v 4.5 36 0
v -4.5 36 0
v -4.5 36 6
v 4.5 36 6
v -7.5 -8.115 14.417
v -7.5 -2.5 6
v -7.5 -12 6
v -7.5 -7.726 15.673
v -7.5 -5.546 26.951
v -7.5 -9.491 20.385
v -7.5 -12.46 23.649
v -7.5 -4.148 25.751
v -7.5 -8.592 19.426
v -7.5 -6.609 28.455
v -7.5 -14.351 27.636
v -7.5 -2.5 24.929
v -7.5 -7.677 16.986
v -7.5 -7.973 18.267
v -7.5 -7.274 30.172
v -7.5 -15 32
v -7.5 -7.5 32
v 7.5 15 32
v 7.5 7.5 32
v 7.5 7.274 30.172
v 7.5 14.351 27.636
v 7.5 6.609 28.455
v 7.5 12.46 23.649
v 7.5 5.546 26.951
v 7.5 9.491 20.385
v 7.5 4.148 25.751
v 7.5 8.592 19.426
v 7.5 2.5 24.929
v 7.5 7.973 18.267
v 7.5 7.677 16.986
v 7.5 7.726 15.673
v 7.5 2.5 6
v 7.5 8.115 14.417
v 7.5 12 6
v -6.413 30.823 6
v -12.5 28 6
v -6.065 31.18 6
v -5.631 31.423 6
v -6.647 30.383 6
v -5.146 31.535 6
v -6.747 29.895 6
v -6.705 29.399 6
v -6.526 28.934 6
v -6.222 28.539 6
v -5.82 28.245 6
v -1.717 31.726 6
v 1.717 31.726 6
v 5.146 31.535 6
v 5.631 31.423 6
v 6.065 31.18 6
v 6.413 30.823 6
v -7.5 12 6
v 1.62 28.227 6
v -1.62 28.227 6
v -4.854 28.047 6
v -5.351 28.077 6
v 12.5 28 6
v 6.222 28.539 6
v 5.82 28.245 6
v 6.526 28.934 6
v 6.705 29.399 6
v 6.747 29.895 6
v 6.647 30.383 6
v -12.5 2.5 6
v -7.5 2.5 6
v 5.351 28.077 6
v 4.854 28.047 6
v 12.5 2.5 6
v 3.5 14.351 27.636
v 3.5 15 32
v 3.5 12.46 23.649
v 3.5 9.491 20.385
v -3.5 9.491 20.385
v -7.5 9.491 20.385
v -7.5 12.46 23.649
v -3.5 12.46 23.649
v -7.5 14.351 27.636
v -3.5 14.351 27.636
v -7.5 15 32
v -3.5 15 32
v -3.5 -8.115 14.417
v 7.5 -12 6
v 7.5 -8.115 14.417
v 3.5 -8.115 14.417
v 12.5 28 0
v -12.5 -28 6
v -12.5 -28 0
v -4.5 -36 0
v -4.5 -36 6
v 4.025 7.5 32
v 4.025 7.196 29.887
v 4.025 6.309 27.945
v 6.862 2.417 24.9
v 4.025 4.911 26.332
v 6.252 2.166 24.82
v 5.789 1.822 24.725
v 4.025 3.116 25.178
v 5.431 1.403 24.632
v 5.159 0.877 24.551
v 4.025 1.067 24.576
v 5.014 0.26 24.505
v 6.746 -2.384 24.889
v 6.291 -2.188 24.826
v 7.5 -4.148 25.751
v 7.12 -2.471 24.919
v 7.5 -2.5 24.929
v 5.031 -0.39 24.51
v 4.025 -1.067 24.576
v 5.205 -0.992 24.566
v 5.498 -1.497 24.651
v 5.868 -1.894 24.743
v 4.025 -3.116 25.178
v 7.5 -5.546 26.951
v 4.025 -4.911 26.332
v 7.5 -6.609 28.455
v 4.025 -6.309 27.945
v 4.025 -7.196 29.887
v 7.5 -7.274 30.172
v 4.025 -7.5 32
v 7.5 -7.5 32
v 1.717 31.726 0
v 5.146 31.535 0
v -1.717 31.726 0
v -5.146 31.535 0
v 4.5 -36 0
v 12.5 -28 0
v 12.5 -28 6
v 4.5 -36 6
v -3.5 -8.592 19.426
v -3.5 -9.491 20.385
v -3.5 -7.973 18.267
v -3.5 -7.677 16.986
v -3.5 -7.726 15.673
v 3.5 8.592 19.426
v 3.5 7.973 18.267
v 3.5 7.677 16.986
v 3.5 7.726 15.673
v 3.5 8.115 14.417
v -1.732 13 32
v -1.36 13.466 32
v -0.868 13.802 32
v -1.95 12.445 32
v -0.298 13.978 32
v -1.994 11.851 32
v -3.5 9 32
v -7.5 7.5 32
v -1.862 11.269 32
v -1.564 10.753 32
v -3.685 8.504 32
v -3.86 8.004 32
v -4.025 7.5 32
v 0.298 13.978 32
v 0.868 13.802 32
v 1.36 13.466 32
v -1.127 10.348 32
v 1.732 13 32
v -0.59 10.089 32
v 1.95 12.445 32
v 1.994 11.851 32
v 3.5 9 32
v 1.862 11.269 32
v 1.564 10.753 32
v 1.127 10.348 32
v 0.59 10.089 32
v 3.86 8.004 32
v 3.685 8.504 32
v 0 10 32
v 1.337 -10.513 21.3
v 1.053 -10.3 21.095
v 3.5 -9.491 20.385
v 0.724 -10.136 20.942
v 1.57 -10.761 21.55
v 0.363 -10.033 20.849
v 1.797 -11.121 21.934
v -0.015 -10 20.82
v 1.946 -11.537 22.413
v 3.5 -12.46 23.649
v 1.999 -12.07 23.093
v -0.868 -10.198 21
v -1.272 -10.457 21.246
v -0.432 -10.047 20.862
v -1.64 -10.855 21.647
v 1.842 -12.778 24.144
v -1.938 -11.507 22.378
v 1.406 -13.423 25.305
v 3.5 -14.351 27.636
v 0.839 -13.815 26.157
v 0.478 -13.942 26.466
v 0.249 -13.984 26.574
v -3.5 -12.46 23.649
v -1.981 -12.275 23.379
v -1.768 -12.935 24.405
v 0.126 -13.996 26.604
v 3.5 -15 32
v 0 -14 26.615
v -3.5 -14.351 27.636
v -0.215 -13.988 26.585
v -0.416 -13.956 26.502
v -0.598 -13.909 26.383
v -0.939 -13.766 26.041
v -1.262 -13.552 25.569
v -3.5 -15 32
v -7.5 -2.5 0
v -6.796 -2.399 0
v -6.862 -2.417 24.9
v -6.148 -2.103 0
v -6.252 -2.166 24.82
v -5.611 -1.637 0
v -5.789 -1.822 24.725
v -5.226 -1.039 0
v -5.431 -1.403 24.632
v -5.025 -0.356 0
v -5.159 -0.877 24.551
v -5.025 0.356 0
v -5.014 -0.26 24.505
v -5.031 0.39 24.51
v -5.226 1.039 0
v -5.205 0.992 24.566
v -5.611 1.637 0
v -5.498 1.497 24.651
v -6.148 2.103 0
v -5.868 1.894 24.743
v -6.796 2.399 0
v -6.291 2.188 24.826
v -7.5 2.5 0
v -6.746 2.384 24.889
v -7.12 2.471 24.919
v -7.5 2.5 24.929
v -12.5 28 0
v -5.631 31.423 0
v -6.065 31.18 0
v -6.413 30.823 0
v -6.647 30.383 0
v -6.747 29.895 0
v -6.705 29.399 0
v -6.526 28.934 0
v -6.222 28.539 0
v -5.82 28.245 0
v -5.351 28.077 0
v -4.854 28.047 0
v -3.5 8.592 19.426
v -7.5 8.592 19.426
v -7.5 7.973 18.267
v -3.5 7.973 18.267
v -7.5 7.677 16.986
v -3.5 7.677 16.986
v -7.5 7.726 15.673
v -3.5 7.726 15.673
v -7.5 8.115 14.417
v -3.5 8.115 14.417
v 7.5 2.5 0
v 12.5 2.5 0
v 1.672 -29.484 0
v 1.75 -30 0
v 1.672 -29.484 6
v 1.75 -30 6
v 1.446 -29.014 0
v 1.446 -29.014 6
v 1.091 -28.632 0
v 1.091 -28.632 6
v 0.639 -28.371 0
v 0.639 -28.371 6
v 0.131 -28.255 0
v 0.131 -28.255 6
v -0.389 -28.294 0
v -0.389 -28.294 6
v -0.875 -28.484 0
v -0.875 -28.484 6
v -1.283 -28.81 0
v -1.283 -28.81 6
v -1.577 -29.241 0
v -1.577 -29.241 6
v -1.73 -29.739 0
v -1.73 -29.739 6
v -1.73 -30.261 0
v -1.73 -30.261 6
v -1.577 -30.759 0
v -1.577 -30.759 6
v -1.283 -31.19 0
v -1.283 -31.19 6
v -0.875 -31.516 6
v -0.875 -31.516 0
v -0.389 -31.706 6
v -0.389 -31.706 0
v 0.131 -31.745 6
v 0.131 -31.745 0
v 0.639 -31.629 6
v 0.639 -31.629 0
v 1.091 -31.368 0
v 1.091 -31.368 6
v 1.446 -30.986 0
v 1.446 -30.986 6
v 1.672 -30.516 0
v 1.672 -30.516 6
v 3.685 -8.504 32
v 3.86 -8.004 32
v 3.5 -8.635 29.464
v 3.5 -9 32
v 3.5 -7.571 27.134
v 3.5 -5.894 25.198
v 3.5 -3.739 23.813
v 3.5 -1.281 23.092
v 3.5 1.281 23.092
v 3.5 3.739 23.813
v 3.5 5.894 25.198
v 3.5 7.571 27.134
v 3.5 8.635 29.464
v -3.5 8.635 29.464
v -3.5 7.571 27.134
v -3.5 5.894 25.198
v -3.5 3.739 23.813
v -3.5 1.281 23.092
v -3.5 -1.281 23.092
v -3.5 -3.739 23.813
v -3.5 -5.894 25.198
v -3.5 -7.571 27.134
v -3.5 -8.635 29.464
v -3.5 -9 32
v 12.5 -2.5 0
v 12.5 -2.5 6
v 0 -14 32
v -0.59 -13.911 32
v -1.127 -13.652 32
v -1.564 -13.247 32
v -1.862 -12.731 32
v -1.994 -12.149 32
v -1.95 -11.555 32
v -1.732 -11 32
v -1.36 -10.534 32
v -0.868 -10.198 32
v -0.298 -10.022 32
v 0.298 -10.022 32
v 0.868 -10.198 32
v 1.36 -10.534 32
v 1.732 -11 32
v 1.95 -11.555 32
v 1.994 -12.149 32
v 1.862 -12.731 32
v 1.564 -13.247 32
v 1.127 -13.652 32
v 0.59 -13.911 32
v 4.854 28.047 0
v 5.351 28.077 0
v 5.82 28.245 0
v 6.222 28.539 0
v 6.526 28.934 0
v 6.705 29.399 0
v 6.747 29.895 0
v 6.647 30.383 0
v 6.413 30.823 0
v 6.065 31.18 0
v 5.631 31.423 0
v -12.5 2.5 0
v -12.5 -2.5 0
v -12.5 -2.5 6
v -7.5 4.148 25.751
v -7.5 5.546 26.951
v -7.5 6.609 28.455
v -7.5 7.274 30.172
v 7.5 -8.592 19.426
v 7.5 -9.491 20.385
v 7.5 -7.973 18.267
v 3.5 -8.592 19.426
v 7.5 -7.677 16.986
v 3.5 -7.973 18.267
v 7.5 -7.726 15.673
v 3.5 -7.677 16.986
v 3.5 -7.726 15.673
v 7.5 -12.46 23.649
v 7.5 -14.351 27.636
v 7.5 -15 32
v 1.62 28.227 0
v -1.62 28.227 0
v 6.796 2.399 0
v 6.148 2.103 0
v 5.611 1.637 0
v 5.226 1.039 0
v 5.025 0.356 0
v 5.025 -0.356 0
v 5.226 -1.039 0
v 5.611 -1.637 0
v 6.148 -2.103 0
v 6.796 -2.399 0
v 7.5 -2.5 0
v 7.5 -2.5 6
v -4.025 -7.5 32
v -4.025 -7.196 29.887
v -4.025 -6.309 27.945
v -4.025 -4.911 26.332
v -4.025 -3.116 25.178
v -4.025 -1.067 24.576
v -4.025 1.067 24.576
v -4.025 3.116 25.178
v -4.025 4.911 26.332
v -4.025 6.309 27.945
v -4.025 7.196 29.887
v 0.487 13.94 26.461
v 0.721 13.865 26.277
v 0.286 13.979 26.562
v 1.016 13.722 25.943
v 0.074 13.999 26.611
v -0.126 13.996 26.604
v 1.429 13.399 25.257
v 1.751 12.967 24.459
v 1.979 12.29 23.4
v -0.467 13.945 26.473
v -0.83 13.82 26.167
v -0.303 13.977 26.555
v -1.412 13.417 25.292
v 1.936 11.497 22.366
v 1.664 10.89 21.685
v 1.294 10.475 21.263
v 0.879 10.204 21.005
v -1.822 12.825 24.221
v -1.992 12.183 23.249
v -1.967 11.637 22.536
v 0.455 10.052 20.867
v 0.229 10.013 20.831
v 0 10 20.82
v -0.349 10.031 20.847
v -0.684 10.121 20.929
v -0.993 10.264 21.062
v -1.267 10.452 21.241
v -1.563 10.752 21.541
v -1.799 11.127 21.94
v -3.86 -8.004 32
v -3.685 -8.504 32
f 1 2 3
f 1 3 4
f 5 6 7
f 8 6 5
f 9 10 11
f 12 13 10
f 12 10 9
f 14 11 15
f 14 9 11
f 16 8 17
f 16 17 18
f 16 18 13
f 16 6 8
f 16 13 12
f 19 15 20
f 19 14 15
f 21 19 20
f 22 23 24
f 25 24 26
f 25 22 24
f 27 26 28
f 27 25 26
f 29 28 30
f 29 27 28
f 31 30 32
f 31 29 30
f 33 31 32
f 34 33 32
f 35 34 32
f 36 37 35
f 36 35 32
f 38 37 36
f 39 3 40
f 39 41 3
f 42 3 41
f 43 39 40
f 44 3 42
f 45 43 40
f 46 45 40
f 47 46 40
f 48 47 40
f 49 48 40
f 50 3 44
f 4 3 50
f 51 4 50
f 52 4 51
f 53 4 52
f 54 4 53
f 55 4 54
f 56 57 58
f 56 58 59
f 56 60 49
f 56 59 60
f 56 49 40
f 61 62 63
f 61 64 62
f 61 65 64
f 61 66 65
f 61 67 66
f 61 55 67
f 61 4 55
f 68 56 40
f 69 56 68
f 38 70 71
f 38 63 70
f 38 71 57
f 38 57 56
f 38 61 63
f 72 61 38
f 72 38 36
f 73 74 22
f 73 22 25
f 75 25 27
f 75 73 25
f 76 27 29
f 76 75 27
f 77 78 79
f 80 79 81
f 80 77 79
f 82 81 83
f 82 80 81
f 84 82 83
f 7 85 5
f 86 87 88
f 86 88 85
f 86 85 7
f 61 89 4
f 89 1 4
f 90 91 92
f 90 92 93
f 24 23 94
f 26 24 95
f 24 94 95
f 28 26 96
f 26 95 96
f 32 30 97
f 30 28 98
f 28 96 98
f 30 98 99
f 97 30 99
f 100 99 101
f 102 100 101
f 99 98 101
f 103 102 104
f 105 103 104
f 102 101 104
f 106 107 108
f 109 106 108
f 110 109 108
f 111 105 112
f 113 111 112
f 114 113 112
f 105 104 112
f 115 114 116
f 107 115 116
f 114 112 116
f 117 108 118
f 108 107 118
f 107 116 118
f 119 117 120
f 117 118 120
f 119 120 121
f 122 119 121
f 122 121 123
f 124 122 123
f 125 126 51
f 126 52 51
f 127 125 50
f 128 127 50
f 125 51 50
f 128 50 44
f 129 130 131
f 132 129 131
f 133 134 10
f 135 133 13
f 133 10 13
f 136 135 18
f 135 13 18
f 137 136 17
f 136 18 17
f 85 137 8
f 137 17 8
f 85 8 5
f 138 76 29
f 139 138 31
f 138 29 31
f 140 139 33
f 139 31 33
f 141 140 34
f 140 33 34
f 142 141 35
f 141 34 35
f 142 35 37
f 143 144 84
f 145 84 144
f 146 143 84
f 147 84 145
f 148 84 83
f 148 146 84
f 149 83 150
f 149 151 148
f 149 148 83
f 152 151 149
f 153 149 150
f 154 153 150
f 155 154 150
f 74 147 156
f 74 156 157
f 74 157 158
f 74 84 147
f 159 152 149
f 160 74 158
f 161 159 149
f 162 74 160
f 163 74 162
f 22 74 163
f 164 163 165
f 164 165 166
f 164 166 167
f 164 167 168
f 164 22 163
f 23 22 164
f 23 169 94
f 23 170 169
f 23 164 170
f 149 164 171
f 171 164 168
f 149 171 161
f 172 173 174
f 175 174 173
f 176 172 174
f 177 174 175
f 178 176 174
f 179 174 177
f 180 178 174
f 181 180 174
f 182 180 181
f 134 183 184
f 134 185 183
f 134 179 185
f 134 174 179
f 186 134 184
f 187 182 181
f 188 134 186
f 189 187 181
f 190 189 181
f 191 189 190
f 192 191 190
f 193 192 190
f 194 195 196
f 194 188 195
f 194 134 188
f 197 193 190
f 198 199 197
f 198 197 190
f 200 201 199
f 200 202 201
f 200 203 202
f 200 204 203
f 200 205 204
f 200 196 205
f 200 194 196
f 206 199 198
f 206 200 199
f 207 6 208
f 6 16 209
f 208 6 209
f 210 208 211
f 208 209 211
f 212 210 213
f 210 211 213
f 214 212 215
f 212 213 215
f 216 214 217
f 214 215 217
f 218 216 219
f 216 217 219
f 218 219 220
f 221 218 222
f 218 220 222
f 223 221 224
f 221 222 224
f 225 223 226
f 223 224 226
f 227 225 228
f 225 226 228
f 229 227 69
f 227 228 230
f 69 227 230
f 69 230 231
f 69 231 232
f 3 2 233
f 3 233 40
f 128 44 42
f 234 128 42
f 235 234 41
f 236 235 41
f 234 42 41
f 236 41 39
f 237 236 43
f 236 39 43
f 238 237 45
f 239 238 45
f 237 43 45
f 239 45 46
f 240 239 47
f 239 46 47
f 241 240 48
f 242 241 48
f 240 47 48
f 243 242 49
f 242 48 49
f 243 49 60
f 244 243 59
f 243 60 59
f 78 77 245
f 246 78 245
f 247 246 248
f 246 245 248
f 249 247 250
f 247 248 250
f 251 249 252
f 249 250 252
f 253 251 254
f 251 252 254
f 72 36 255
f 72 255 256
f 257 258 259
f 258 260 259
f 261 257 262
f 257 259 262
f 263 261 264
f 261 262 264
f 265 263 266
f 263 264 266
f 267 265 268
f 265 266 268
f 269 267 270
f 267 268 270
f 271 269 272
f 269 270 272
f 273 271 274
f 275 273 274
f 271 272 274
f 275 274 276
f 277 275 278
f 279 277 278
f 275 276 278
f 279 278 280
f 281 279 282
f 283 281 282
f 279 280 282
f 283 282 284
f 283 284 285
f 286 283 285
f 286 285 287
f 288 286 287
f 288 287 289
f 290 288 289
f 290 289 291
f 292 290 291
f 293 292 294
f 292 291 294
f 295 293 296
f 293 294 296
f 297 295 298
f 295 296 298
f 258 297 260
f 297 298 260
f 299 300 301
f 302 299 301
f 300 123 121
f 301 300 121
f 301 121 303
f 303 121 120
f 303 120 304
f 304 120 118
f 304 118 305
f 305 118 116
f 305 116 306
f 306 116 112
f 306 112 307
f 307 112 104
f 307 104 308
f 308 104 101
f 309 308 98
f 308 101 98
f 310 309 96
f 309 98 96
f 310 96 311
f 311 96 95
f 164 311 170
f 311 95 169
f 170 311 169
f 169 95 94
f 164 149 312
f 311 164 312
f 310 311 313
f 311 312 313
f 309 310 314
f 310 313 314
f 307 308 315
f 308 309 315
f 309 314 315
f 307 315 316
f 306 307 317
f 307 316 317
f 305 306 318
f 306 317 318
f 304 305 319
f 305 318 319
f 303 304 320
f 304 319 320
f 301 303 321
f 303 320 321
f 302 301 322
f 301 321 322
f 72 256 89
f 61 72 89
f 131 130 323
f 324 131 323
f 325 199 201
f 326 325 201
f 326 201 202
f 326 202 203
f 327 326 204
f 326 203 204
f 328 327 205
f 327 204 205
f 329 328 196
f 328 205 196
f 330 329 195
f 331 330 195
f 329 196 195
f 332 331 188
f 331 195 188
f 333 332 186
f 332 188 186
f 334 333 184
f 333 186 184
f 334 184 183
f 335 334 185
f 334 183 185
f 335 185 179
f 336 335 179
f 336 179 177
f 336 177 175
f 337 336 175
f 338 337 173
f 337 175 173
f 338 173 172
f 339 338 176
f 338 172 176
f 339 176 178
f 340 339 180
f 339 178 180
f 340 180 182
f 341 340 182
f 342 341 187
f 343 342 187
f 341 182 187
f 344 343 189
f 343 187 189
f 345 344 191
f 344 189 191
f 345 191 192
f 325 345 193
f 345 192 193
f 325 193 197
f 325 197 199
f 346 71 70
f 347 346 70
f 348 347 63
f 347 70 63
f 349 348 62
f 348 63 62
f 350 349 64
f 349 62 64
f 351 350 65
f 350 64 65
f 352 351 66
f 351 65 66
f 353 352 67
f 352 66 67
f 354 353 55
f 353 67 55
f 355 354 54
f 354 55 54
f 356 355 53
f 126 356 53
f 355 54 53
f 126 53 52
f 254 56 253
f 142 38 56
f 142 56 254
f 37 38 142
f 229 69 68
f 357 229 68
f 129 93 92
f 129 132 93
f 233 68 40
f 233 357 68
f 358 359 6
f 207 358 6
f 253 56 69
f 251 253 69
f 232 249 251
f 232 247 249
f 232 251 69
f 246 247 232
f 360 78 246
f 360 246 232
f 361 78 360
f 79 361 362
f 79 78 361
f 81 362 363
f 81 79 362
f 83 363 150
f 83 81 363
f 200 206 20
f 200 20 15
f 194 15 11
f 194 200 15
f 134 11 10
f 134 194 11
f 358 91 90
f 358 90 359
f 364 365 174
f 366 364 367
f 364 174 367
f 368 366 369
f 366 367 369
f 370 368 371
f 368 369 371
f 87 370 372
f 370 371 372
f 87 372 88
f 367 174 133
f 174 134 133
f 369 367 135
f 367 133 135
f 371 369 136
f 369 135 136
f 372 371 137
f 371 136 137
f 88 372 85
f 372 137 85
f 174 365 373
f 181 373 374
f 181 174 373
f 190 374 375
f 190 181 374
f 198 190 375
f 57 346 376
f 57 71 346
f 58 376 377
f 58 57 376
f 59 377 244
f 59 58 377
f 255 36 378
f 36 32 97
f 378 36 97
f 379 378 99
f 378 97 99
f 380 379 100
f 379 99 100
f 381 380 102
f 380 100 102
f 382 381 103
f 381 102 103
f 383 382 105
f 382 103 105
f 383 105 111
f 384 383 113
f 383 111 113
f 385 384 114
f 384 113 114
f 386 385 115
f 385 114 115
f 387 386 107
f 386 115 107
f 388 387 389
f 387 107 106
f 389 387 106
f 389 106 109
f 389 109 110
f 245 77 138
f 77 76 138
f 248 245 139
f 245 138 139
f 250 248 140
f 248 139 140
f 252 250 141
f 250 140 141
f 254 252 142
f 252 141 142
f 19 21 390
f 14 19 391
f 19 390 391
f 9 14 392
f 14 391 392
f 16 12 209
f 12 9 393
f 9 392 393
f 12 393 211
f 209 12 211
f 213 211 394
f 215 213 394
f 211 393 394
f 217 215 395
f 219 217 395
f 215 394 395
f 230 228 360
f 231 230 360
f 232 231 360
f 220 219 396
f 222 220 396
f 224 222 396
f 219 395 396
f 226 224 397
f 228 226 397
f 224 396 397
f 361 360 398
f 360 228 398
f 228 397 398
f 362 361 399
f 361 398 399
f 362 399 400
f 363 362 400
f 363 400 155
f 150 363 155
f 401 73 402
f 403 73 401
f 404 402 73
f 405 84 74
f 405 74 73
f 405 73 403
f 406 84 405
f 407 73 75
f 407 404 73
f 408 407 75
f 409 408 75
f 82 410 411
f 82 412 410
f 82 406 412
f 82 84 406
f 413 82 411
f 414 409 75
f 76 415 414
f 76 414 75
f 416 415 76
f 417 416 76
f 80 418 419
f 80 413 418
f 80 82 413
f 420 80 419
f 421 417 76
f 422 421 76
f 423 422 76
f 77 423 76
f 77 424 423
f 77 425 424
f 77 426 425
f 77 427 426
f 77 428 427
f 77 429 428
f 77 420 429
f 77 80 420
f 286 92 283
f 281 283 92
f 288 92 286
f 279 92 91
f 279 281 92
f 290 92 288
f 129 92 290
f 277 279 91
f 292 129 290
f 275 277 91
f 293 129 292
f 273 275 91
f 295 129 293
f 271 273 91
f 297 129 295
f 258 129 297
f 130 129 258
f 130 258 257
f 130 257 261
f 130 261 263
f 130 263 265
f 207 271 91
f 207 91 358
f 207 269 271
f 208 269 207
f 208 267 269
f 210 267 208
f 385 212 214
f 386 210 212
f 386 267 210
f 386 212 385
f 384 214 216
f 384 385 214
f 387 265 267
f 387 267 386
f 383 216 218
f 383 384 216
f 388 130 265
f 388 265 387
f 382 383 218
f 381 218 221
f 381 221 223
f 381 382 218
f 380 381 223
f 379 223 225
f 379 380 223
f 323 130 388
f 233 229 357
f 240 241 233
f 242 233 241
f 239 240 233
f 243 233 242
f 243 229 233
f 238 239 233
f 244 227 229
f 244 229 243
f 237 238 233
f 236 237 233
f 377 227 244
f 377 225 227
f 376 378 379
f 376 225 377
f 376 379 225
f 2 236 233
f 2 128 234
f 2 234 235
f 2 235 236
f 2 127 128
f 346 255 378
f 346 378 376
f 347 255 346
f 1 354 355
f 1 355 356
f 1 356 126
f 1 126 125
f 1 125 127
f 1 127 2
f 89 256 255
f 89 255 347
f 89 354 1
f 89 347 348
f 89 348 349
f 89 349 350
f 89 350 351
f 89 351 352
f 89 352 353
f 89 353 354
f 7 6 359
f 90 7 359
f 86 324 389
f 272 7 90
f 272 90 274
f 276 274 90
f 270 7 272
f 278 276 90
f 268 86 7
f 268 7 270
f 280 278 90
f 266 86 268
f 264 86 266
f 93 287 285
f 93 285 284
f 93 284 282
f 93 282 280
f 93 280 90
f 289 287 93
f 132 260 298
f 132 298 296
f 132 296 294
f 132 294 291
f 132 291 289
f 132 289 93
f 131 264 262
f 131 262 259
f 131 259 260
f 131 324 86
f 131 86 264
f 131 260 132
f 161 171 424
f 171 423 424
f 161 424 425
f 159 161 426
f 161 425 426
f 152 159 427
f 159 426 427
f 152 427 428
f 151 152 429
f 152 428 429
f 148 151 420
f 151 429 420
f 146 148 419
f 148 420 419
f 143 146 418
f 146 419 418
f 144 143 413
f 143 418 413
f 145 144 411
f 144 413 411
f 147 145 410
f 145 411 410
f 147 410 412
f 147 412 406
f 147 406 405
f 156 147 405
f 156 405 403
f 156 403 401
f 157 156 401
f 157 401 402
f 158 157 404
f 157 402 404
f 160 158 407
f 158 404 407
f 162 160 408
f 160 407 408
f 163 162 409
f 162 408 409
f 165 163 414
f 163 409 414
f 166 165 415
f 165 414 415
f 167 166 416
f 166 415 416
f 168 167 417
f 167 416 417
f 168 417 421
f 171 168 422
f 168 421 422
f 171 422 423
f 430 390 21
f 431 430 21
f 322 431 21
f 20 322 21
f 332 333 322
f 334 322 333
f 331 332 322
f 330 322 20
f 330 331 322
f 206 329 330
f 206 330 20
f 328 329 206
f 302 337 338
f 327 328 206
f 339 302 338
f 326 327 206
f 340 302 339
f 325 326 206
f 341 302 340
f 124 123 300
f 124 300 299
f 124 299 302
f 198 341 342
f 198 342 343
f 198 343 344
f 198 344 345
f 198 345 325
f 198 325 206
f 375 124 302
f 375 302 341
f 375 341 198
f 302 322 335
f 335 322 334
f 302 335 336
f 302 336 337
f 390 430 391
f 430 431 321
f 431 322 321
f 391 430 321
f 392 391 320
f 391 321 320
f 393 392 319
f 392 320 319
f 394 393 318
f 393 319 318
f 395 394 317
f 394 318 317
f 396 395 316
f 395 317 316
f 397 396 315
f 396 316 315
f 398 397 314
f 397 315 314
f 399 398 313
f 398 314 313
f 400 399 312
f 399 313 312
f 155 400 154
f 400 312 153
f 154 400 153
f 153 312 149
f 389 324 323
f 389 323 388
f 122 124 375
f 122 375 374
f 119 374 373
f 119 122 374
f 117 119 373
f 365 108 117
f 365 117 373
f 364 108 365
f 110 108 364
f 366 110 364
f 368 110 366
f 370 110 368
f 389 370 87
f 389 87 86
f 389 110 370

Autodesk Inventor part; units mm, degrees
ref_plane "YZ Plane" through (0, 0, 0) normal (1, 0, 0) x (0, 1, 0)
ref_plane "XZ Plane" through (0, 0, 0) normal (0, 1, 0) x (-1, 0, 0)
ref_plane "XY Plane" through (0, 0, 0) normal (0, 0, 1) x (1, 0, 0)
sketch "Sketch1" plane through (0, 0, 0) normal (1, 0, 0) x (0, 1, 0)
  line L0 (-36, 0) -> (36, 0)
  line L1 (36, 0) -> (36, 6)
  line L2 (36, 6) -> (-36, 6)
  line L3 (-36, 6) -> (-36, 0)
  circle A0 centre (0, 32) radius 9
  circle A1 centre (0, 32) radius 15
  line L4 (0, 32) -> (3.7715, 23.8284) construction
  line L5 (6.2859, 18.3806) -> (12, 6)
  line L6 (0, 32) -> (-3.7715, 23.8284) construction
  line L7 (-6.2859, 18.3806) -> (-12, 6)
  line L8 (15, 32) -> (9, 32)
  line L9 (-9, 32) -> (-15, 32)
  point P0 (0, 0)
  point P1 (0, 0)
  point P2 (12, 32)
  dimension "d3" = 18
  dimension "d4" = 32
  dimension "d5" = 6
  dimension "d6" = 72
  dimension "d7" = 6
  dimension "d44" = 12
  dimension "d45" = 12
extrude "Extrusion1" add sketch "Sketch1" along normal mid plane 7 contours L3 L2 L1 L0 | L7 A1 L5 L2 | A1 L9 A0 L8 picked at (12.871, 30.8714)
sketch "Sketch2" plane through (3.5, 0, 0) normal (1, 0, 0) x (0, 0, -1)
  line L0 (-6, 36) -> (-6, 12) projected
  line L1 (-6, 12) -> (-18.3806, 6.2859) projected
  arc A0 (-18.3806, 6.2859) -> (-32, 15) centre (-32, 0) ccw projected
  line L2 (-32, 15) -> (-32, 9) projected
  arc A1 (-32, -9) -> (-32, 9) centre (-32, 0) ccw projected
  line L3 (-32, -9) -> (-32, -15) projected
  arc A2 (-32, -15) -> (-18.3806, -6.2859) centre (-32, 0) ccw projected
  line L4 (-18.3806, -6.2859) -> (-6, -12) projected
  line L5 (-6, -12) -> (-6, -36) projected
  line L6 (-6, -36) -> (0, -36) projected
  line L7 (0, -36) -> (0, 36) projected
  line L8 (0, 36) -> (-6, 36) projected
  arc A3 (-32, -7.5) -> (-32, 7.5) centre (-32, 0) ccw
  line L9 (-32, 9) -> (-32, 7.5)
  line L10 (-32, -9) -> (-32, -15) projected
  line L11 (-32, -7.5) -> (-32, -9)
  point P0 (0, 0)
  dimension "d14" = 1.5
extrude "Extrusion2" add sketch "Sketch2" along normal blind 4
sketch "Sketch3" plane through (-3.5, 0, 0) normal (-1, 0, 0) x (0, 0, 1)
  arc A0 (18.3806, -6.2859) -> (32, -15) centre (32, 0) ccw projected
  line L0 (18.3806, -6.2859) -> (6, -12) projected
  line L1 (6, -12) -> (6, -36) projected
  line L2 (6, -36) -> (0, -36) projected
  line L3 (0, -36) -> (0, 36) projected
  line L4 (0, 36) -> (6, 36) projected
  line L5 (6, 36) -> (6, 12) projected
  line L6 (6, 12) -> (18.3806, 6.2859) projected
  arc A1 (32, 15) -> (18.3806, 6.2859) centre (32, 0) ccw projected
  line L7 (32, 15) -> (32, 7.5) projected
  arc A2 (32, 7.5) -> (32, -7.5) centre (32, 0) ccw projected
  line L8 (32, -7.5) -> (32, -15) projected
  point P0 (0, 0)
extrude "Extrusion3" add sketch "Sketch3" along normal blind 4
sketch "Sketch4" plane through (7.5, -36, 0) normal (0, 0, -1) x (-1, 0, 0)
  line L0 (15, 72) -> (15, 0) projected
  line L1 (0, 0) -> (0, 72) projected
  line L2 (15, 0) -> (20, 0)
  line L3 (20, 0) -> (20, 72)
  line L4 (20, 72) -> (15, 72)
  line L5 (15, 72) -> (15, 0)
  line L6 (0, 0) -> (-5, 0)
  line L7 (-5, 0) -> (-5, 72)
  line L8 (-5, 72) -> (0, 72)
  line L9 (0, 72) -> (0, 0)
  point P0 (7.5, 36)
  dimension "d17" = 25
extrude "Extrusion4" add sketch "Sketch4" against normal up to surface (6 mm away)
sketch "Sketch5" plane through (3.5, -9, 32) normal (0, 0, 1) x (1, 0, 0)
  line L0 (4, 9) -> (-11, 9)
  line L1 (-11, 9) -> (-31, 9) construction
  line L2 (-11, 1.5) -> (-11, 16.5) projected
  line L3 (-11, 11.5) -> (-31, 11.5)
  line L4 (-31, 6.5) -> (-11, 6.5)
  arc A0 (-11, 6.5) -> (-11, 11.5) centre (-11, 9) ccw
  arc A1 (-31, 11.5) -> (-31, 6.5) centre (-31, 9) ccw
  line L5 (4, 9) -> (24, 9) construction
  line L6 (4, 11.5) -> (24, 11.5)
  line L7 (24, 6.5) -> (4, 6.5)
  arc A2 (4, 11.5) -> (4, 6.5) centre (4, 9) ccw
  arc A3 (24, 6.5) -> (24, 11.5) centre (24, 9) ccw
  point P0 (-3.5, 9)
  point P1 (-3.5, 9)
  point P2 (-21, 9)
  point P3 (14, 9)
  dimension "d20" = 15
  dimension "d52" = 20
  dimension "d53" = 20
  dimension "d54" = 5
sketch "Sketch8" plane through (3.5, -9, 32) normal (0, 0, 1) x (1, 0, 0)
  line L0 (-11, -6) -> (4, -6) projected
  line L1 (4, 1.5) -> (4, -6) projected
  line L2 (0, 1.5) -> (4, 1.5) projected
  line L3 (0, 1.5) -> (0, 0) projected
  line L4 (-7, 0) -> (0, 0) projected
  line L5 (-7, 0) -> (-7, 1.5) projected
  line L6 (-7, 1.5) -> (-11, 1.5) projected
  line L7 (-11, -6) -> (-11, 1.5) projected
  line L8 (-7, 18) -> (0, 18) projected
  line L9 (0, 18) -> (0, 16.5) projected
  line L10 (0, 16.5) -> (4, 16.5) projected
  line L11 (4, 24) -> (4, 16.5) projected
  line L12 (-11, 24) -> (4, 24) projected
  line L13 (-11, 16.5) -> (-11, 24) projected
  line L14 (-7, 16.5) -> (-11, 16.5) projected
  line L15 (-7, 16.5) -> (-7, 18) projected
  line L16 (-7, 0) -> (0, 0) projected
  line L17 (-3.5, 0) -> (-3.5, -6)
  line L18 (-7, 18) -> (0, 18) projected
  line L19 (-3.5, 18) -> (-3.5, 24)
  line L20 (-11, 24) -> (4, 24) projected
  line L21 (-16, -27) -> (9, -27) projected
  line L22 (-16, 45) -> (9, 45) projected
  point P0 (-3.5, 9)
  point P1 (-3.5, -3)
  point P2 (-3.5, 21)
hole "Hole2" at (0, -12, 32) at (0, 12, 32) direction (0, 0, -1) diameter 4 depth 16
sketch "Sketch6" plane through (3.5, -9, 32) normal (0, 0, 1) x (1, 0, 0)
  line L0 (-11, -6) -> (4, -6) projected
  line L1 (4, 1.5) -> (4, -6) projected
  line L2 (0, 1.5) -> (4, 1.5) construction
  line L3 (0, 1.5) -> (0, 0) projected
  line L4 (-7, 0) -> (0, 0) projected
  line L5 (-7, 0) -> (-7, 1.5) projected
  line L6 (-7, 1.5) -> (-11, 1.5) construction
  line L7 (-11, -6) -> (-11, 1.5) projected
  line L8 (9, 45) -> (9, -27) projected
  line L9 (9, 9) -> (-16, 9)
  line L10 (-16, -27) -> (-16, 45) projected
  line L11 (-7, 18) -> (0, 18) projected
  line L12 (0, 18) -> (0, 16.5) projected
  line L13 (0, 16.5) -> (4, 16.5) projected
  line L14 (4, 24) -> (4, 16.5) projected
  line L15 (-11, 24) -> (4, 24) projected
  line L16 (-11, 16.5) -> (-11, 24) projected
  line L17 (-7, 16.5) -> (-11, 16.5) projected
  line L18 (-7, 16.5) -> (-7, 18) projected
  line L19 (0, 1.5) -> (4, 1.5) projected
  line L20 (0, 16.5) -> (0, 1.5) projected
  line L21 (-7, 1.5) -> (-7, 16.5) projected
  line L22 (-7, 1.5) -> (-11, 1.5) projected
  arc A0 (0, 0) -> (0, 18) centre (-23.3238, 9) ccw
  arc A1 (-7, 18) -> (-7, 0) centre (16.3238, 9) ccw
  point P0 (-3.5, 9)
  point P1 (-7, 9)
  point P2 (-8.6762, 9)
  point P3 (1.6762, 9)
  point P4 (0, 9)
  dimension "d30" = 25
  dimension "d31" = 25
revolve "Revolution1" cut sketch "Sketch6" angle 360 about axis through (12.5, 0, 32) along (-1, 0, 0) contours A1 L9 L21 L22 | L22 L5 A1 | A0 L3 L19 | L19 L20 L9 A0
fillet "Fillet1" radius 5 2 edges at (0, 6.2859, 18.3806) (0, -6.2859, 18.3806)
sketch "Sketch10" plane through (-12.5, 36, 6) normal (0, 0, 1) x (1, 0, 0)
  line L0 (12.5, -66) -> (12.5, -6)
  line L1 (0, 0) -> (25, 0) projected
  circle A0 centre (12.5, -66) radius 1.75
  arc A1 (17.5, -6.2087) -> (7.5, -6.2087) centre (12.5, -66) ccw construction
  arc A2 (17.6458, -4.4648) -> (7.3542, -4.4648) centre (12.5, -66) ccw
  arc A3 (17.3542, -7.9526) -> (7.6458, -7.9526) centre (12.5, -66) ccw
  arc A4 (17.3542, -7.9526) -> (17.6458, -4.4648) centre (17.5, -6.2087) ccw
  arc A5 (7.3542, -4.4648) -> (7.6458, -7.9526) centre (7.5, -6.2087) ccw
  point P0 (12.5, -36)
  point P1 (12.5, -36)
  dimension "d46" = 60
  dimension "d47" = 3.5
  dimension "d48" = 3.5
  dimension "d49" = 5
extrude "Extrusion5" cut sketch "Sketch10" against normal through all
extrude "Extrusion6" cut sketch "Sketch5" against normal up to surface (32 mm away)
chamfer "Chamfer1" distance 8 angle 45 4 edges at (12.5, 36, 3) (-12.5, 36, 3) (12.5, -36, 3) (-12.5, -36, 3)
equation "\"d3\" = LENS_D"
equation "\"d45\" = d44"
equation "\"d10\" = LENS_L"
equation "\"d30\" = LENS_R"
equation "\"d31\" = LENS_R"
equation "\"LENS_D\" = 18"
equation "\"LENS_L\" = 7"
equation "\"LENS_R\" = 25"
properties part number "LensHolder"
